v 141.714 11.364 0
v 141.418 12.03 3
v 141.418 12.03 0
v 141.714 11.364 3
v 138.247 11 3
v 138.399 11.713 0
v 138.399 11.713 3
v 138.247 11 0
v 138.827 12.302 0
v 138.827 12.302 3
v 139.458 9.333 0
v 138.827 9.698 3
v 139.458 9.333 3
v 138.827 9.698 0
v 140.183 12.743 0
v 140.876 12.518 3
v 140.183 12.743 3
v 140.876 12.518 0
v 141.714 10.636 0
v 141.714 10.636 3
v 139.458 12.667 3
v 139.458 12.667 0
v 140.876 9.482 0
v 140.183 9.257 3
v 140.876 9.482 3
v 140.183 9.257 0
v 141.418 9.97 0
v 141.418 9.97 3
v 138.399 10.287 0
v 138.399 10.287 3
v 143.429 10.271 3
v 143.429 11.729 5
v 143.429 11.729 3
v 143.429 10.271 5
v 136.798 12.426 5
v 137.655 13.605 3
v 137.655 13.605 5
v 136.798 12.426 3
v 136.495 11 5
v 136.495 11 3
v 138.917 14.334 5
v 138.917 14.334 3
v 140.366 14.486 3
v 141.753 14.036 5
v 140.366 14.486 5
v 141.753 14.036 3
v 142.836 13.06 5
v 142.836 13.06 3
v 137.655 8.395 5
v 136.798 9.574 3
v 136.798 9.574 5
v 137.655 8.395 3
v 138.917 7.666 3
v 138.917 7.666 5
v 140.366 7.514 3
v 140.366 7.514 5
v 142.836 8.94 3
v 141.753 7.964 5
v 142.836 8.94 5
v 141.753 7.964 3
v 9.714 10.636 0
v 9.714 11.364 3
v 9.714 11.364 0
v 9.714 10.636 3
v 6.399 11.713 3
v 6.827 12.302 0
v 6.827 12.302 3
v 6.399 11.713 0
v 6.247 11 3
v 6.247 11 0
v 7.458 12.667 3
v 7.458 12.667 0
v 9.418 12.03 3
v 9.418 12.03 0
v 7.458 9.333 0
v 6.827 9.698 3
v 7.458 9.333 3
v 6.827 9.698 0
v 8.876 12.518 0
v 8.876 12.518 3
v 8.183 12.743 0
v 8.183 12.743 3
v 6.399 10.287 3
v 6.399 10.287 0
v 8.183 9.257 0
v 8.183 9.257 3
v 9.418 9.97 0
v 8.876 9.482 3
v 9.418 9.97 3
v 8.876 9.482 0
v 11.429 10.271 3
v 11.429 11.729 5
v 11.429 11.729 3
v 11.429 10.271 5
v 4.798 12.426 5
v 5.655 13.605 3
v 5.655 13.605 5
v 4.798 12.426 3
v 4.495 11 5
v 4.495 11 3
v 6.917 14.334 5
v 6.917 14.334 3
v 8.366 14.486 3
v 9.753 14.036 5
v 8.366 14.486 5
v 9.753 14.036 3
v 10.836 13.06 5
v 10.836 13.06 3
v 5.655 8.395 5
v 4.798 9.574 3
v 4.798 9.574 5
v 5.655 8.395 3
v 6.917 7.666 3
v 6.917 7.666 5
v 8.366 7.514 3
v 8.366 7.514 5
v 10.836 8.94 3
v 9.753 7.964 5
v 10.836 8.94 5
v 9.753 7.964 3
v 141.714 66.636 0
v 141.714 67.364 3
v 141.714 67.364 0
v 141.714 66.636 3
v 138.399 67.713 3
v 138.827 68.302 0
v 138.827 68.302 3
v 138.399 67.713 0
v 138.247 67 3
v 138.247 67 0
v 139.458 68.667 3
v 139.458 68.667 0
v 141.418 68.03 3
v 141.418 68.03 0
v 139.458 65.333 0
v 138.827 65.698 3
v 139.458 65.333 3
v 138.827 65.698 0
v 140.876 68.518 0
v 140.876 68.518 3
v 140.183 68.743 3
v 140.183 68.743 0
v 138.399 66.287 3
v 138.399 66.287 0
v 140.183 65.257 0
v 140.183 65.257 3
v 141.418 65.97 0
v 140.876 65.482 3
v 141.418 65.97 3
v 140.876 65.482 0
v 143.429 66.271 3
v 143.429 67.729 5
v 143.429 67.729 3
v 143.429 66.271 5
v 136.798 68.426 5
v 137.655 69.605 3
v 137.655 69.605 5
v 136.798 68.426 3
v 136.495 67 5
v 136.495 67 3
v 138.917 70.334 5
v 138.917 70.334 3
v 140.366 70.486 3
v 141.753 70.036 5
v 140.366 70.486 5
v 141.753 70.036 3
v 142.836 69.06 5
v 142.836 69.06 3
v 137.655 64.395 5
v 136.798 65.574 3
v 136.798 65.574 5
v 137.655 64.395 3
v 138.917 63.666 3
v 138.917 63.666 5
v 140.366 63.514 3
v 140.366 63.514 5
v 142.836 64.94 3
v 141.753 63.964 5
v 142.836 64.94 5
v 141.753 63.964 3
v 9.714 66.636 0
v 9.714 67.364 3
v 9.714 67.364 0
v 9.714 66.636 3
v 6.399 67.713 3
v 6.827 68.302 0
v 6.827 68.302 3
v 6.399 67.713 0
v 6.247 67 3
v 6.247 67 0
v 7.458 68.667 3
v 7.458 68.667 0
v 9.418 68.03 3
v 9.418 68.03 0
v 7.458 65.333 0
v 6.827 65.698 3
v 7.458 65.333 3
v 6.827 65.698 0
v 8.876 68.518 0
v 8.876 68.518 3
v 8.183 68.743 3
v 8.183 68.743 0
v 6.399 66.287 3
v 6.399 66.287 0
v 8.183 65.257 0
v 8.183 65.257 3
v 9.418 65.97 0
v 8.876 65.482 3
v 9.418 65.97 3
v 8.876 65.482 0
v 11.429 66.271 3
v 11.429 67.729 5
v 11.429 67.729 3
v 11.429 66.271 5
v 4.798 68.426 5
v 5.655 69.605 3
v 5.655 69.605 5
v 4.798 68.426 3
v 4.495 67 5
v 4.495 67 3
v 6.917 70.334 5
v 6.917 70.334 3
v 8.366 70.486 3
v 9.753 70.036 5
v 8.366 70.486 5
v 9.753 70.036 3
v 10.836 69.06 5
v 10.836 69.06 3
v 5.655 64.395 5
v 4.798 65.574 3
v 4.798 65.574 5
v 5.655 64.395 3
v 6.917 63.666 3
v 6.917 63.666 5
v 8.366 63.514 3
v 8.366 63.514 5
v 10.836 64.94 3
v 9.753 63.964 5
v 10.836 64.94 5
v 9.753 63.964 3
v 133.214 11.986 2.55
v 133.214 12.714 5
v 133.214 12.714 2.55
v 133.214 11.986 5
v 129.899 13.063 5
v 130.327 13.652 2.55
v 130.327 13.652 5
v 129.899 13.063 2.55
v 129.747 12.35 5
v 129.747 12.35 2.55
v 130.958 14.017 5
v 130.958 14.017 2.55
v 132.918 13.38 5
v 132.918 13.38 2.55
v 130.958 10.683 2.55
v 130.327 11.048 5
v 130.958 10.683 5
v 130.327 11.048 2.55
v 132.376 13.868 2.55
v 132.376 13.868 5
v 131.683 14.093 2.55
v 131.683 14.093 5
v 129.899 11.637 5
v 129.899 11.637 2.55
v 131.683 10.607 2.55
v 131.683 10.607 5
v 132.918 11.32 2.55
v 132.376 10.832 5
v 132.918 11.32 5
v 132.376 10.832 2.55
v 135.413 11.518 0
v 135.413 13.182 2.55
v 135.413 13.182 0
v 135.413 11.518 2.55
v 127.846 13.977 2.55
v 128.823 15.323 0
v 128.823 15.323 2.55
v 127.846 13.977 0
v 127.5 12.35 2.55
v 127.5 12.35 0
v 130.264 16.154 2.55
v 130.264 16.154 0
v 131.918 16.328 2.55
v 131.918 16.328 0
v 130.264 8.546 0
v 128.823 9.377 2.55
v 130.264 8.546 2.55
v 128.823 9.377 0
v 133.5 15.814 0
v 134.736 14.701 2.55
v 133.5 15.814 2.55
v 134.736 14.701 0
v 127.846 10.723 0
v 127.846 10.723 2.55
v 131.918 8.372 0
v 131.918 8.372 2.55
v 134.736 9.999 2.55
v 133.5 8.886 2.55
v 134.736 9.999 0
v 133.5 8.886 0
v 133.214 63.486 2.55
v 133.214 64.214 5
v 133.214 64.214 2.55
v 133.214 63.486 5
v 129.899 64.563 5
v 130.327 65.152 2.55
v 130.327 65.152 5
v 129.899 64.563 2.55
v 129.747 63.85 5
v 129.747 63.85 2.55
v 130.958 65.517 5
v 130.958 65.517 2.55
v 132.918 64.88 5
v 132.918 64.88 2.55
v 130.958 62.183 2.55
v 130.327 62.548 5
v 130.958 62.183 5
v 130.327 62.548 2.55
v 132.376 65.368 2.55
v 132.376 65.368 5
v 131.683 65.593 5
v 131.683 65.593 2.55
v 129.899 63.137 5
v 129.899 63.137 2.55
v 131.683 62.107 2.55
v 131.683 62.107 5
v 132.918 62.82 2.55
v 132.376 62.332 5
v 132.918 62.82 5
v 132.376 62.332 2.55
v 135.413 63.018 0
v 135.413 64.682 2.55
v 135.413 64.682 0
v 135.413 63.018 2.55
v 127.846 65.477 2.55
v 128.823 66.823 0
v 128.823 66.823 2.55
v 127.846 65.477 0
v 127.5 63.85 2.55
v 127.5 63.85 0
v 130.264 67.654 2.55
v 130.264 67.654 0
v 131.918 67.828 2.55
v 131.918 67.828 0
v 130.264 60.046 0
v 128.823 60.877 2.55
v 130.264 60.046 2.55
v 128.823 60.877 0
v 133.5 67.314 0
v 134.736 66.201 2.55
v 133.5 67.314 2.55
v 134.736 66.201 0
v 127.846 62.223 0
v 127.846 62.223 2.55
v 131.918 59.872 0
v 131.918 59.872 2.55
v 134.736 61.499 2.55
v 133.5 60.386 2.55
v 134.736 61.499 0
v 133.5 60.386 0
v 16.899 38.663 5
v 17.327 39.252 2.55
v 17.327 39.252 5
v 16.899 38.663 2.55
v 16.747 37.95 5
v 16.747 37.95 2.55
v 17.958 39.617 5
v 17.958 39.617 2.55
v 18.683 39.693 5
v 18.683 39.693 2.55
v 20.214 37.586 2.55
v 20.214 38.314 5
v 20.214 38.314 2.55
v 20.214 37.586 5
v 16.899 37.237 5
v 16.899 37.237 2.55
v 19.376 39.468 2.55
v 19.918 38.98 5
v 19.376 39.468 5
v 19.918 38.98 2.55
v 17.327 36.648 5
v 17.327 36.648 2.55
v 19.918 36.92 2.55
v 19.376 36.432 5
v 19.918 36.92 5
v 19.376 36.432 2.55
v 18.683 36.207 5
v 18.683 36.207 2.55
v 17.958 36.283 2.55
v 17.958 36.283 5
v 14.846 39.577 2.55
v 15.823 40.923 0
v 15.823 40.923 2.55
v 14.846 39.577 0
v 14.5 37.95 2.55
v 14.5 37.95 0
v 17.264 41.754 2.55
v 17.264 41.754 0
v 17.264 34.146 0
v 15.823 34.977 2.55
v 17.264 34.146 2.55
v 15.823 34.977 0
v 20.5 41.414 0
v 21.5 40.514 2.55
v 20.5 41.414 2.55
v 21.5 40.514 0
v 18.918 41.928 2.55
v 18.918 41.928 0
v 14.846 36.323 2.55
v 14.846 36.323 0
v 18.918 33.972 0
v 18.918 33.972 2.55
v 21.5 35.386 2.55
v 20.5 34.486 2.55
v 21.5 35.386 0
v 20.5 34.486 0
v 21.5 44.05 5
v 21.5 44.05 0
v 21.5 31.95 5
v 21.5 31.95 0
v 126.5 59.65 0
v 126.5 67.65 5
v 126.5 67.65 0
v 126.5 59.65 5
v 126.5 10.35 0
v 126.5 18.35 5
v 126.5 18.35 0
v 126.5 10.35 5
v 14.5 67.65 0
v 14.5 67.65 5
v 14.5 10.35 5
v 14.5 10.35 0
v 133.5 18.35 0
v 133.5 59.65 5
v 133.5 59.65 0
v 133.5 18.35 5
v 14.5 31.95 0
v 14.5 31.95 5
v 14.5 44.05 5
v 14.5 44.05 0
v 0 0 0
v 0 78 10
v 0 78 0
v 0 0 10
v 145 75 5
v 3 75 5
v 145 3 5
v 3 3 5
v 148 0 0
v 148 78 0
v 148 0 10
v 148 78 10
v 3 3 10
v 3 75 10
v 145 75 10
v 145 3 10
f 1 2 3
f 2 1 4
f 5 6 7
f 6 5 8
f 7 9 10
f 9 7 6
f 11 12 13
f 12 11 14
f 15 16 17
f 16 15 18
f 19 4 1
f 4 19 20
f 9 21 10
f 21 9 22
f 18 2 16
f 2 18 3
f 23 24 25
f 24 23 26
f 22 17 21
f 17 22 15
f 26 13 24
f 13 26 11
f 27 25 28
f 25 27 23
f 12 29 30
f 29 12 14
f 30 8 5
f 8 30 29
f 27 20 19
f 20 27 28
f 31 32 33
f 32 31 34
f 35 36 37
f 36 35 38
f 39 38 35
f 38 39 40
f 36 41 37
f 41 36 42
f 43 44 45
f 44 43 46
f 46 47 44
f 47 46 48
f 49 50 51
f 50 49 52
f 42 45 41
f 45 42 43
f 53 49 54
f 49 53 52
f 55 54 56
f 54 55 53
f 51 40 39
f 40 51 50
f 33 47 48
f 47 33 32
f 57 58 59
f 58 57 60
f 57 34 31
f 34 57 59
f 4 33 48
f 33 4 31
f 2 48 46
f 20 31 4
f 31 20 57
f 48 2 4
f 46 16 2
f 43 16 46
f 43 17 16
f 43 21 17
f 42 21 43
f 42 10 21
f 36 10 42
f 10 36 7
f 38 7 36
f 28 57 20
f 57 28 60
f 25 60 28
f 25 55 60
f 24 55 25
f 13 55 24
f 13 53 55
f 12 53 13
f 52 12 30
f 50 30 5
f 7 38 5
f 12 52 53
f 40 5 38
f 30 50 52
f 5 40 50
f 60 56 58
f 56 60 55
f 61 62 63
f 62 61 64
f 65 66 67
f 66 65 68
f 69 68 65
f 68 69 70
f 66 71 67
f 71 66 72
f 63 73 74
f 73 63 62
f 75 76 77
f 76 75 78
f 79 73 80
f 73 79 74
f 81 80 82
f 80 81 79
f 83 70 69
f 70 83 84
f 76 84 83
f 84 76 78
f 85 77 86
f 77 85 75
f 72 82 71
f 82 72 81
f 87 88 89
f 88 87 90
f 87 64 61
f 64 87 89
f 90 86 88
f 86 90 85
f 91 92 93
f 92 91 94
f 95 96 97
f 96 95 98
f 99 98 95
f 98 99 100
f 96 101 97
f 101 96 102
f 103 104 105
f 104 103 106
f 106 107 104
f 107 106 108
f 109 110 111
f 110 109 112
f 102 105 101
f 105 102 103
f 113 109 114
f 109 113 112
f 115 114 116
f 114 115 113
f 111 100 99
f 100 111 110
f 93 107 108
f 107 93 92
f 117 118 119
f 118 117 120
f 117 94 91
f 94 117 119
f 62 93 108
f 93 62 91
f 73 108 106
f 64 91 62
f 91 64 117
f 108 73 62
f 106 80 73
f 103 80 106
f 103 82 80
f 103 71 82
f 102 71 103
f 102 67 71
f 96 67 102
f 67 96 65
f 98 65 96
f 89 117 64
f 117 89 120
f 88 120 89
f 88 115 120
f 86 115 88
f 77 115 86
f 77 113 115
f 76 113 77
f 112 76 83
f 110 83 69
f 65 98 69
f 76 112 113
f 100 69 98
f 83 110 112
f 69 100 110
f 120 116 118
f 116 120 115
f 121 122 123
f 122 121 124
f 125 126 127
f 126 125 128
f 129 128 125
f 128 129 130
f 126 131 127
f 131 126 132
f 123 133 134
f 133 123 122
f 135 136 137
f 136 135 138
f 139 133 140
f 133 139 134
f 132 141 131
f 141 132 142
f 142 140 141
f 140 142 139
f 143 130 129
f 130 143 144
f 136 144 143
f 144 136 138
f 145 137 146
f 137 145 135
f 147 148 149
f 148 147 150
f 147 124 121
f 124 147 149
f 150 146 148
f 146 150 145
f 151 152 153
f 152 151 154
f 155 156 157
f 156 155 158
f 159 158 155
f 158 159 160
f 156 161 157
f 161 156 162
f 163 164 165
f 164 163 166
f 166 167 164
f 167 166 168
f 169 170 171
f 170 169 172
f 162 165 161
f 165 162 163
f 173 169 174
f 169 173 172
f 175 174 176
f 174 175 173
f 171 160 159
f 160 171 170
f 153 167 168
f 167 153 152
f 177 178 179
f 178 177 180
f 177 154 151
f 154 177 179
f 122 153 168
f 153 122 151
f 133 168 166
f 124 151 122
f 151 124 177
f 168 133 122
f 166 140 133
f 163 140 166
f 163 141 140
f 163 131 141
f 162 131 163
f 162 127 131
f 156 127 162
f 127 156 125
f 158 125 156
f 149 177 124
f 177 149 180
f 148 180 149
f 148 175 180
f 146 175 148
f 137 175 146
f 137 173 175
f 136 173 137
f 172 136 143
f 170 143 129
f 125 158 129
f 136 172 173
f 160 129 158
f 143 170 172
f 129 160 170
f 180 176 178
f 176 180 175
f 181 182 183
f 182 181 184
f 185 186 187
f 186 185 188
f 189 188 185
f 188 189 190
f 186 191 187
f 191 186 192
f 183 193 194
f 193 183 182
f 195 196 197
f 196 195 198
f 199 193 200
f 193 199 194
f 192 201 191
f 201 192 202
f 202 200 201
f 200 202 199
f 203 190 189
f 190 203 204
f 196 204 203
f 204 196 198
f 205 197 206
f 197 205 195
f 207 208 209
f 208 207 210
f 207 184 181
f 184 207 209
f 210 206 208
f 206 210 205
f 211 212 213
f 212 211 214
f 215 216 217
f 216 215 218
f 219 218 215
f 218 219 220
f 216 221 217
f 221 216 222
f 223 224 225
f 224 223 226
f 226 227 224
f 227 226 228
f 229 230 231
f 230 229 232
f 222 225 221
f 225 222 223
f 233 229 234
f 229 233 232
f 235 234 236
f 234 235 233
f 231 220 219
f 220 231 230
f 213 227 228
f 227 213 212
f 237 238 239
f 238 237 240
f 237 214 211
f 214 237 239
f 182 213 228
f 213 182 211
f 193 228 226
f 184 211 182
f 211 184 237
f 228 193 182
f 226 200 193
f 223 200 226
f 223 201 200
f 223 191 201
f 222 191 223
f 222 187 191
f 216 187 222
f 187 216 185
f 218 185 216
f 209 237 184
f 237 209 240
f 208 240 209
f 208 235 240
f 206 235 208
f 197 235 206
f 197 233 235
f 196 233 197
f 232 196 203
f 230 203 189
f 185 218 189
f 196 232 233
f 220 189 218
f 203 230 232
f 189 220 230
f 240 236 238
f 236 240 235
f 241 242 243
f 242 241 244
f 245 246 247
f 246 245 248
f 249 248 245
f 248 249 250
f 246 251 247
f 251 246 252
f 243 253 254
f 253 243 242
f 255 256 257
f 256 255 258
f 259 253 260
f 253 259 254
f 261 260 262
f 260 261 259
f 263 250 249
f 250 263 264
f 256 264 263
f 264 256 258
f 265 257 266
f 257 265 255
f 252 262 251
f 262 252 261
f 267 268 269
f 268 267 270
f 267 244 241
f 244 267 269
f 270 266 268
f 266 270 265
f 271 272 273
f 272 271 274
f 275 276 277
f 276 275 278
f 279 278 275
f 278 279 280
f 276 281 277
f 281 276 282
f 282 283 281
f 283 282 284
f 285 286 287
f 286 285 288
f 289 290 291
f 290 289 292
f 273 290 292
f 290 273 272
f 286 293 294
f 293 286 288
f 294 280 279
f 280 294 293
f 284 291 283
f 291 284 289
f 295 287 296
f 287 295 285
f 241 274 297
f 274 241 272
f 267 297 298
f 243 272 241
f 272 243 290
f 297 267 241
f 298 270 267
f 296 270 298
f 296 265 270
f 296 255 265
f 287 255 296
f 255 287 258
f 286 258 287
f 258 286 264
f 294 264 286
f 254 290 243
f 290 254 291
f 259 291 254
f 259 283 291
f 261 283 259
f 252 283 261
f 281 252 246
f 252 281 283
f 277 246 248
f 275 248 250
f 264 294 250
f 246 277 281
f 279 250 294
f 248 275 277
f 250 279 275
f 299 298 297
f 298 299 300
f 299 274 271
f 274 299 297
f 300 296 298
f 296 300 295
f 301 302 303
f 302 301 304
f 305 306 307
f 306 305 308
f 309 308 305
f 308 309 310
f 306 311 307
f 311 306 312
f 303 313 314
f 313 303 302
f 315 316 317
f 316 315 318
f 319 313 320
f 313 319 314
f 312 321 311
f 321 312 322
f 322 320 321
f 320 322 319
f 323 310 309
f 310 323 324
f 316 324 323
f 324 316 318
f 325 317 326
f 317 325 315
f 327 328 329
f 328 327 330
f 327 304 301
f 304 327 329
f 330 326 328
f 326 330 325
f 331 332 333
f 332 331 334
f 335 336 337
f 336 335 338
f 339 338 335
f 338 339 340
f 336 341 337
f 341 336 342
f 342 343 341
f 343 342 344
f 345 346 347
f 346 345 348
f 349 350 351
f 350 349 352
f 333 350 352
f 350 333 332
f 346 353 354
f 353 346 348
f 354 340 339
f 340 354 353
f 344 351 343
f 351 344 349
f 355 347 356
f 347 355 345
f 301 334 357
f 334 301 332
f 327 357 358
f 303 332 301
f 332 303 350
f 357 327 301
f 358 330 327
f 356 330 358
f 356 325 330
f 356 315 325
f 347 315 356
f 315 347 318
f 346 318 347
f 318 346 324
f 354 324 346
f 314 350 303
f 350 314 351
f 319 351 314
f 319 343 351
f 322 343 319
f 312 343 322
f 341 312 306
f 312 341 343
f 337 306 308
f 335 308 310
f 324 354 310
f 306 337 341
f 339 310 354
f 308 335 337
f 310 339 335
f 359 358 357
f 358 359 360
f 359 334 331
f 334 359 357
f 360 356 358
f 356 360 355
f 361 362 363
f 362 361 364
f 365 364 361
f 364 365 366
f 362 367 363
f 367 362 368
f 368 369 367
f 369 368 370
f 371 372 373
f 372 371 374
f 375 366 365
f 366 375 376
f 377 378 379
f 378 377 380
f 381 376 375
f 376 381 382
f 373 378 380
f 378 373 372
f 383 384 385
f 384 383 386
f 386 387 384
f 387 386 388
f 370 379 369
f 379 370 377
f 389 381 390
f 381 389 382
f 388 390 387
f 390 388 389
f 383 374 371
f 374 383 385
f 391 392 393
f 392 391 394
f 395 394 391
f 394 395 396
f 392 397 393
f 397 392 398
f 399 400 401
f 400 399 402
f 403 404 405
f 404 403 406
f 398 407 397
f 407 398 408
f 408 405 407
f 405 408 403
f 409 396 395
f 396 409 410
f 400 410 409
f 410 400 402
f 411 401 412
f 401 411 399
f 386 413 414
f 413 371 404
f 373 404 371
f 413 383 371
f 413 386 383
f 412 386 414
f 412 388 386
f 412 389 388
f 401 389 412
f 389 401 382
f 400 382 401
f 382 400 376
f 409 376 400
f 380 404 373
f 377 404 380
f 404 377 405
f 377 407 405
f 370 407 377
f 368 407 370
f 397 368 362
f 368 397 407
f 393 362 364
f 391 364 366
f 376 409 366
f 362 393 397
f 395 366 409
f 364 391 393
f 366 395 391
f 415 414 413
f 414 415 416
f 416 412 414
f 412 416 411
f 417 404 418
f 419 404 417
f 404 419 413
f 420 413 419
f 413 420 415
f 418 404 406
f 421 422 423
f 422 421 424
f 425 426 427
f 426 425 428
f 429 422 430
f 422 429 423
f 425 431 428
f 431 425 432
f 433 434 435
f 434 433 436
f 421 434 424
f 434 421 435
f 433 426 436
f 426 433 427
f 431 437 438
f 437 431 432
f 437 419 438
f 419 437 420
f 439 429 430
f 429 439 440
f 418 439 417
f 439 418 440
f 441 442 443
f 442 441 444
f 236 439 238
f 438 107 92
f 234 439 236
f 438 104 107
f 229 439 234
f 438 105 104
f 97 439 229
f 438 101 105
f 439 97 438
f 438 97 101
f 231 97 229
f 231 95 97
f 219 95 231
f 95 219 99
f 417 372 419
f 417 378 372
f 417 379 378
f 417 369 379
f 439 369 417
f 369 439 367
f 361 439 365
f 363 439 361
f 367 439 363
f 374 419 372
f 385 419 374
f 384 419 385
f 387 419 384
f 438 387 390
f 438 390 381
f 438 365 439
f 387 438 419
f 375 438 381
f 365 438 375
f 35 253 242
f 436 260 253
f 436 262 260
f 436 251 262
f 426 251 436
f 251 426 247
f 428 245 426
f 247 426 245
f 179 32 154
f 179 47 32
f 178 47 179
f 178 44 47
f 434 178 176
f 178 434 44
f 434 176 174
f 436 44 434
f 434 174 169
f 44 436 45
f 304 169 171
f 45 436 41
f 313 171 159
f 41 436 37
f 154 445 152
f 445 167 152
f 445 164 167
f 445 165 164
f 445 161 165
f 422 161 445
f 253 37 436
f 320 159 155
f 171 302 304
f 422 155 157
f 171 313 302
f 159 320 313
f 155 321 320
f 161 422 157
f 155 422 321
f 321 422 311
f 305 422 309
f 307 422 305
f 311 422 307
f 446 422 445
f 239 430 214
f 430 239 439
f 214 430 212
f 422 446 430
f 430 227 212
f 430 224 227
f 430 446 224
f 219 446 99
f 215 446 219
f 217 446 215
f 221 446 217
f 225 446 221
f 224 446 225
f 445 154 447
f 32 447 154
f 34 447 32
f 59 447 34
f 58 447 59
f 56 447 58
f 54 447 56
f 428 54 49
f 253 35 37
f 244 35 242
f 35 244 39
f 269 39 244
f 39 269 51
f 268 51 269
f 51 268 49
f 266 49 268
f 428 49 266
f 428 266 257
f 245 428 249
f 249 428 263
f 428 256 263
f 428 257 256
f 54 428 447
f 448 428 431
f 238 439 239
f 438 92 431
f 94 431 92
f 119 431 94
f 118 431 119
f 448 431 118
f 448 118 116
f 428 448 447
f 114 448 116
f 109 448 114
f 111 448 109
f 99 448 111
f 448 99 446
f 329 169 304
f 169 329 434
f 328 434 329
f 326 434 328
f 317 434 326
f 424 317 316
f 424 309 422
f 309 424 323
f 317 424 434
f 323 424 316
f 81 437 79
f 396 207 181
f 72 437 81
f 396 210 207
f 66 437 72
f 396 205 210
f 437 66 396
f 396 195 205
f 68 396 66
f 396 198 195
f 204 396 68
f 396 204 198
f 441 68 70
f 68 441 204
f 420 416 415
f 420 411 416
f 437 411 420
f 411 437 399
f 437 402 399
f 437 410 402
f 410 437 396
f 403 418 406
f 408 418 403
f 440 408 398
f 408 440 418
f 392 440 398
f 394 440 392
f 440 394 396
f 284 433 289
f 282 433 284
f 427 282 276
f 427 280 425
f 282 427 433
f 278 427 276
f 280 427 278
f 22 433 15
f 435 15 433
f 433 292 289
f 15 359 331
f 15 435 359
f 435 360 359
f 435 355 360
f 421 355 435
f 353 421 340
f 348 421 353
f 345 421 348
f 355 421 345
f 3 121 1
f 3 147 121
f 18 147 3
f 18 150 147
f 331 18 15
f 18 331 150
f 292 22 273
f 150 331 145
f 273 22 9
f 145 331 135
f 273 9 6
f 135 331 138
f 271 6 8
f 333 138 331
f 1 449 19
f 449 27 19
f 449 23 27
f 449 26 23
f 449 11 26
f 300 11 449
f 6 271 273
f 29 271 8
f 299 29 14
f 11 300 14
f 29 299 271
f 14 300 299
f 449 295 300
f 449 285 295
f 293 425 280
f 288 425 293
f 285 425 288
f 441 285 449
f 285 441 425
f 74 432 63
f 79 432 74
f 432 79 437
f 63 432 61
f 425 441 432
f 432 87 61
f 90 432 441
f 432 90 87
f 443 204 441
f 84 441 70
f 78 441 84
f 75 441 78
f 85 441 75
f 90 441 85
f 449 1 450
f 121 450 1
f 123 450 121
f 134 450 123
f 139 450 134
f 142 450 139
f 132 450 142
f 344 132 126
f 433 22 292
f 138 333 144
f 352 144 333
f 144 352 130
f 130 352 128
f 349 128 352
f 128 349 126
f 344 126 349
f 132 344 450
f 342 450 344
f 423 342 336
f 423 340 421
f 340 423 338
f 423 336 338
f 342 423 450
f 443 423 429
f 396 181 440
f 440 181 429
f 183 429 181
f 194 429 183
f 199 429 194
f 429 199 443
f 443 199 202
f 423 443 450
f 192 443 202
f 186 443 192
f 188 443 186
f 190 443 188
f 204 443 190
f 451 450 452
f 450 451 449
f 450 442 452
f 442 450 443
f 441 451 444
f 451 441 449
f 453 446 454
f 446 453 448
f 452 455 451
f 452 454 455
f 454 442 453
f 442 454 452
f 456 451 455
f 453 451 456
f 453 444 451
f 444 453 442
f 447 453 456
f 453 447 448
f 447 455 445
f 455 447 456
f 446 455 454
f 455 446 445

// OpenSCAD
border = 1;

atx_width = 150-border*2;
atx_height = 80-border*2;

ridge = 3;

atx_screws = [ [8, 8+3, 0], [140, 8+3, 0], [ 8, 64+3, 0], [140, 64+3, 0] ];

sfx_width = 125.0;
sfx_height = 63.3;

sfx_screws = [ [6-border, 6-border, 0.0], [6-border, 51.5+6-border, 0.0],
		[6+88+25-border, 31.6-border, 0.0] ];
		
screw_r = 3.5052/2;

plate_d = 5.0;
plate_m = 0.05;

adaptor();

module adaptor()
{
	union()
	{
				cube([ridge, atx_height, plate_d*2]);
				cube([atx_width, ridge, plate_d*2]);
				translate([atx_width-ridge, 0.0, 0.0]) cube([ridge, atx_height, plate_d*2]);
				translate([0.0, atx_height-ridge, 0.0]) cube([atx_width, ridge, plate_d*2]);
		translate([atx_width, 0.0, 0]) mirror([1.0, 0.0, 0.0]) difference()
		{
			union()
			{
				cube([atx_width, atx_height, plate_d]);
			}
			union()
			{
				// mount holes
				translate([0.0, 0.0, -plate_m]) for(i=[0:1:3])
				{
					translate(atx_screws[i]) cylinder(plate_d+plate_m*2,
							screw_r, screw_r, $fn=15);
                    translate([0,0,3+plate_m]) translate(atx_screws[i]) cylinder(plate_d+plate_m,
							screw_r*2, screw_r*2, $fn=15);
				}
				// SFX holes
				translate([(atx_width-sfx_width)/2, (atx_height-sfx_height)/2, -plate_m]) for(i=[0:1:2])
				{
					translate(sfx_screws[i]) cylinder(plate_d+plate_m*2,
							screw_r, screw_r, $fn=15);
                   translate([0,0,0-plate_d/2]) translate(sfx_screws[i]) cylinder(plate_d+plate_m*2,
							4, 4, $fn=15);
				}
				// SFX cutouts
				translate([(atx_width-sfx_width)/2, (atx_height-sfx_height)/2, -plate_m]) 
				{
					translate([10.0, 3.0, 0.0]) cube([sfx_width-10.0*2,
							sfx_height-3.0*2, plate_d+plate_m*2]);
				 	translate([3.0, 10.0+1, 0.0]) cube([sfx_width-3.0-10.0,
							sfx_height-10.0*2-2, plate_d+plate_m*2]);
				 	translate([10.0, 3.0, 0.0]) cube([sfx_width-10.0-3.0,
							31.6-5.0-3.0-2, plate_d+plate_m*2]);
					translate([10.0, sfx_height-(31.6-5.0-3.0)-3.0, 0.0]) cube([sfx_width-10.0-3.0,
							31.6-5.0-3.0, plate_d+plate_m*2]);
				}
			}
		}
	}
}
